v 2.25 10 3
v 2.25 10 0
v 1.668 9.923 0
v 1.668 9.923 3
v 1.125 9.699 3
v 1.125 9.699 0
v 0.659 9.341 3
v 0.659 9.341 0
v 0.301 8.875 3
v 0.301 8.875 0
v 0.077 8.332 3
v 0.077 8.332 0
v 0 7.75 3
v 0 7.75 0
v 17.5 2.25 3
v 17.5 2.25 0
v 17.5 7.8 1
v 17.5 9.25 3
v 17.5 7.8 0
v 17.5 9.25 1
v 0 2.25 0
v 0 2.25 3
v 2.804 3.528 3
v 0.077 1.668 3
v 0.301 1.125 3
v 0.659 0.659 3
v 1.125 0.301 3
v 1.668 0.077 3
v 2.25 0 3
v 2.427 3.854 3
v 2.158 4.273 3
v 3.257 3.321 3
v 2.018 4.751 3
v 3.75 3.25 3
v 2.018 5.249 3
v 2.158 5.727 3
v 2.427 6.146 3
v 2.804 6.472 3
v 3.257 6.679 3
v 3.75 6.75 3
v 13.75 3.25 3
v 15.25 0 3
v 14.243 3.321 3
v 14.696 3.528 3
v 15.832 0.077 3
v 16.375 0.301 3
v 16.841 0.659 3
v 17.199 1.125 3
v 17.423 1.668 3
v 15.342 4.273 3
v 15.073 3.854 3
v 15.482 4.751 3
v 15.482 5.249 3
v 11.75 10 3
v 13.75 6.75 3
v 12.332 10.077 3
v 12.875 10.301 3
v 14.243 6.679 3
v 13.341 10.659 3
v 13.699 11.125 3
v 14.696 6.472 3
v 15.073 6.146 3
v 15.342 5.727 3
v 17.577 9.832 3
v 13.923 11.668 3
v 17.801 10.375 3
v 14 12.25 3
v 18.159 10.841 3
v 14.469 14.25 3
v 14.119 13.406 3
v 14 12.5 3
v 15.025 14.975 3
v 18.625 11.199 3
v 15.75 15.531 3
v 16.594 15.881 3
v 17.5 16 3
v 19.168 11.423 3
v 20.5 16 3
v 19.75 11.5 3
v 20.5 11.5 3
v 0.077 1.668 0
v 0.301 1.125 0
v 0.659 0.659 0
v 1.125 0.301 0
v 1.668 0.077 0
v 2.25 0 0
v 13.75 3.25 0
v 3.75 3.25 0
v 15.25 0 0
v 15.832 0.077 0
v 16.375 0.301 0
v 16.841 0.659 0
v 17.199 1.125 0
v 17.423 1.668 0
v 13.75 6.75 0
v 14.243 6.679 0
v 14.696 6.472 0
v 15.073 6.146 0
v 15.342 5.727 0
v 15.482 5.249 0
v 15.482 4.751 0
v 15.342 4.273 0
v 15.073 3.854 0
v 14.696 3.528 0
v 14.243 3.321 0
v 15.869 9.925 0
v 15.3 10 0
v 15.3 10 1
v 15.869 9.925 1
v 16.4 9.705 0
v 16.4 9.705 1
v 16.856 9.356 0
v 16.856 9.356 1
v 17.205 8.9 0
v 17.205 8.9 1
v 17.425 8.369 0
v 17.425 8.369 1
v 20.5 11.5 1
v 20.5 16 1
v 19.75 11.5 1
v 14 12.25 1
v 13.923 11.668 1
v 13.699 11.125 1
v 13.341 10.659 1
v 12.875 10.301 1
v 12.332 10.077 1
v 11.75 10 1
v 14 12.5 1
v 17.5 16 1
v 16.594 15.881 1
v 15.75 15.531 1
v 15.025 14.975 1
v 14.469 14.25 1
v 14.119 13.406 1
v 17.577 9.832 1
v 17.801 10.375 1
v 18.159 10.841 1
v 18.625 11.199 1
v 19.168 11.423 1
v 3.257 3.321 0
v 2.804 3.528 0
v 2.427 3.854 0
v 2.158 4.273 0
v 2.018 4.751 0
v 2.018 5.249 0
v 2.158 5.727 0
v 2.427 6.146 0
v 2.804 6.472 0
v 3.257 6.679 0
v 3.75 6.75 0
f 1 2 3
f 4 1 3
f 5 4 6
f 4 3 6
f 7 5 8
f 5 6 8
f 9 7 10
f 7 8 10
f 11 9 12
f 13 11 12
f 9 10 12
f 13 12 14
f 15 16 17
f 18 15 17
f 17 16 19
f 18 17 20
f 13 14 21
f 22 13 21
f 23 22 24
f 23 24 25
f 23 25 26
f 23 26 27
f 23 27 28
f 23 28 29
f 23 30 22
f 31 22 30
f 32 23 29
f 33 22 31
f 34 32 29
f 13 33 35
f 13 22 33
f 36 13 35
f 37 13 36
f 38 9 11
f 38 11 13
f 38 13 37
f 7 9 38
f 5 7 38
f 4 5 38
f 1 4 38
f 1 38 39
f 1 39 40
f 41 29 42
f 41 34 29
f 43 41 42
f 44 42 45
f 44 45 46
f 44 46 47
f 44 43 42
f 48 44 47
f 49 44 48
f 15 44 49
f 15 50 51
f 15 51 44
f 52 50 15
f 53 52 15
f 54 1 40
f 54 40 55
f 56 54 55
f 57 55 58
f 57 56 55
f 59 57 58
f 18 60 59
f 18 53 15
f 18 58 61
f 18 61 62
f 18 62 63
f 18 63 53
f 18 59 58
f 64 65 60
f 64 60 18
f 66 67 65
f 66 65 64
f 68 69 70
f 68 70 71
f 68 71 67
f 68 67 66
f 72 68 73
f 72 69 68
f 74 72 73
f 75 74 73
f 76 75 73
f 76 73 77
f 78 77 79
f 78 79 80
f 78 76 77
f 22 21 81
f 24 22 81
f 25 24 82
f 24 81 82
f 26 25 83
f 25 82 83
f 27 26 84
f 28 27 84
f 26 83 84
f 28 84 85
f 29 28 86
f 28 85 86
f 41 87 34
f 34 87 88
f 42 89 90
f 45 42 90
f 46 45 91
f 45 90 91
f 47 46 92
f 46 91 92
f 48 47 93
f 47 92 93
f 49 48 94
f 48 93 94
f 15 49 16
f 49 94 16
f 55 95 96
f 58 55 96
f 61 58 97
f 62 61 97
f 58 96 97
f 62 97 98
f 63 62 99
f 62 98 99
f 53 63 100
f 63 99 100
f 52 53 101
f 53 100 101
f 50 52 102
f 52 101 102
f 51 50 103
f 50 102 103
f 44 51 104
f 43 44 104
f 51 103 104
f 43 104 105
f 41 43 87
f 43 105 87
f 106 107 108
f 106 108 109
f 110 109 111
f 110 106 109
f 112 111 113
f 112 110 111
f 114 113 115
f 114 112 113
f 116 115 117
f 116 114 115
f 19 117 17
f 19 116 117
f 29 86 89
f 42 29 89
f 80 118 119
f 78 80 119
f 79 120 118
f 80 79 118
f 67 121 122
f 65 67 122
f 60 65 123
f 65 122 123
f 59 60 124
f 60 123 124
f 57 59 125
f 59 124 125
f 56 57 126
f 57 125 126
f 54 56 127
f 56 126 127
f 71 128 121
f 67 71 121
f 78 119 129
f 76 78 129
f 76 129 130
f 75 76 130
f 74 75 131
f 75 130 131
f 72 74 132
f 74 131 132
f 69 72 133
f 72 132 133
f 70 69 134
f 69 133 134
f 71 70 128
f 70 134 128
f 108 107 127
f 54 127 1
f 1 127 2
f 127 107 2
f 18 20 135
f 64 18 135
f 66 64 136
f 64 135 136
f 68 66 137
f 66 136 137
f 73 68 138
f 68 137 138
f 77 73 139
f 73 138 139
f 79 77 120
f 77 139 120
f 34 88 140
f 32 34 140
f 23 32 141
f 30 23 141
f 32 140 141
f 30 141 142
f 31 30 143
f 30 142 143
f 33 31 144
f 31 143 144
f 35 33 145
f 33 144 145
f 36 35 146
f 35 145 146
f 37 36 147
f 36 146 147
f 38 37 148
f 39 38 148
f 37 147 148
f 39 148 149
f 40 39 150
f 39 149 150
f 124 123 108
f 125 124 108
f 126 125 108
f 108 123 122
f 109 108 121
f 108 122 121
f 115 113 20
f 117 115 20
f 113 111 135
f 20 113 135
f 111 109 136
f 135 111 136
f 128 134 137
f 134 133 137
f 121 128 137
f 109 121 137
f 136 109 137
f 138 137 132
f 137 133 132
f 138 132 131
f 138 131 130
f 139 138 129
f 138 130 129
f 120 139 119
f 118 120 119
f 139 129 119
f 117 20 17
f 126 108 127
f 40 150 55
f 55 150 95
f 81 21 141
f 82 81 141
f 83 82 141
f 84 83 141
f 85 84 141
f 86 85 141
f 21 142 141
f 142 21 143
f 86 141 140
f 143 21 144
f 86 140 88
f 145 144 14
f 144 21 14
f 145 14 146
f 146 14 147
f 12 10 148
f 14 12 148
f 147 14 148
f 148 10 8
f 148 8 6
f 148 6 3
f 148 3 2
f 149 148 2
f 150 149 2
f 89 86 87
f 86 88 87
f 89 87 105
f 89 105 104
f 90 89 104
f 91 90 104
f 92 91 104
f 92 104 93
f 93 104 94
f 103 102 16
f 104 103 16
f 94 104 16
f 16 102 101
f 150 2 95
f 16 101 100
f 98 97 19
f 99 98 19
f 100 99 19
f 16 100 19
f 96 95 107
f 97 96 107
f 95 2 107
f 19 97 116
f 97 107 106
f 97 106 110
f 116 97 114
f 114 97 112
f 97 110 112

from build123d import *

# Parameters (mm, degrees)
AUFSATZ_LINEAR_AUSTRAGEN1_DEPTH = 3
SCHNITT_LINEAR_AUSTRAGEN1_DEPTH = 1
SCHNITT_LINEAR_AUSTRAGEN2_DEPTH = 1


with BuildPart() as part:
    # Skizze1 → Aufsatz-Linear austragen1 (new body)
    with BuildSketch(Plane.XY):
        with BuildLine():
            Line((2.25, 0), (15.25, 0))
            ThreePointArc((15.25, 0), (16.840990258, 0.659009742), (17.5, 2.25))
            Line((17.5, 2.25), (17.5, 9.25))
            ThreePointArc((17.5, 9.25), (18.159009742, 10.840990258), (19.75, 11.5))
            Line((19.75, 11.5), (20.5, 11.5))
            Line((20.5, 11.5), (20.5, 16))
            Line((20.5, 16), (17.5, 16))
            ThreePointArc((17.5, 16), (15.025126266, 14.974873734), (14, 12.5))
            Line((14, 12.5), (14, 12.25))
            ThreePointArc((14, 12.25), (13.340990258, 10.659009742), (11.75, 10))
            Line((11.75, 10), (2.25, 10))
            ThreePointArc((2.25, 10), (0.659009742, 9.340990258), (0, 7.75))
            Line((0, 7.75), (0, 2.25))
            ThreePointArc((0, 2.25), (0.659009742, 0.659009742), (2.25, 0))
        make_face()
        with BuildLine():
            Line((3.75, 6.75), (13.75, 6.75))
            ThreePointArc((13.75, 6.75), (15.5, 5), (13.75, 3.25))
            Line((13.75, 3.25), (3.75, 3.25))
            ThreePointArc((3.75, 3.25), (2, 5), (3.75, 6.75))
        make_face(mode=Mode.SUBTRACT)
    extrude(amount=AUFSATZ_LINEAR_AUSTRAGEN1_DEPTH)

    # Skizze2 → Schnitt-Linear austragen1 (cut)
    with BuildSketch(Plane(origin=(0, 0, 0), x_dir=(-1, 0, 0), z_dir=(0, 0, -1))):
        Polygon((0.473585846, 10), (-20.5, 10), (-20.5, 11.5), (-20.5, 17.5), (0.473585846, 17.5), (0.473585846, 12.5), align=None)
    extrude(amount=-SCHNITT_LINEAR_AUSTRAGEN1_DEPTH, mode=Mode.SUBTRACT)

    # Skizze3 → Schnitt-Linear austragen2 (cut)
    with BuildSketch(Plane(origin=(0, 0, 0), x_dir=(-1, 0, 0), z_dir=(0, 0, -1))):
        with BuildLine():
            Line((-17.5, 7.8), (-18.826048275, 7.8))
            Line((-18.826048275, 7.8), (-18.826048275, 10.648235291))
            Line((-18.826048275, 10.648235291), (-15.3, 10.648235291))
            Line((-15.3, 10.648235291), (-15.3, 10))
            ThreePointArc((-15.3, 10), (-16.855634919, 9.355634919), (-17.5, 7.8))
        make_face()
    extrude(amount=-SCHNITT_LINEAR_AUSTRAGEN2_DEPTH, mode=Mode.SUBTRACT)


solid = part.part
